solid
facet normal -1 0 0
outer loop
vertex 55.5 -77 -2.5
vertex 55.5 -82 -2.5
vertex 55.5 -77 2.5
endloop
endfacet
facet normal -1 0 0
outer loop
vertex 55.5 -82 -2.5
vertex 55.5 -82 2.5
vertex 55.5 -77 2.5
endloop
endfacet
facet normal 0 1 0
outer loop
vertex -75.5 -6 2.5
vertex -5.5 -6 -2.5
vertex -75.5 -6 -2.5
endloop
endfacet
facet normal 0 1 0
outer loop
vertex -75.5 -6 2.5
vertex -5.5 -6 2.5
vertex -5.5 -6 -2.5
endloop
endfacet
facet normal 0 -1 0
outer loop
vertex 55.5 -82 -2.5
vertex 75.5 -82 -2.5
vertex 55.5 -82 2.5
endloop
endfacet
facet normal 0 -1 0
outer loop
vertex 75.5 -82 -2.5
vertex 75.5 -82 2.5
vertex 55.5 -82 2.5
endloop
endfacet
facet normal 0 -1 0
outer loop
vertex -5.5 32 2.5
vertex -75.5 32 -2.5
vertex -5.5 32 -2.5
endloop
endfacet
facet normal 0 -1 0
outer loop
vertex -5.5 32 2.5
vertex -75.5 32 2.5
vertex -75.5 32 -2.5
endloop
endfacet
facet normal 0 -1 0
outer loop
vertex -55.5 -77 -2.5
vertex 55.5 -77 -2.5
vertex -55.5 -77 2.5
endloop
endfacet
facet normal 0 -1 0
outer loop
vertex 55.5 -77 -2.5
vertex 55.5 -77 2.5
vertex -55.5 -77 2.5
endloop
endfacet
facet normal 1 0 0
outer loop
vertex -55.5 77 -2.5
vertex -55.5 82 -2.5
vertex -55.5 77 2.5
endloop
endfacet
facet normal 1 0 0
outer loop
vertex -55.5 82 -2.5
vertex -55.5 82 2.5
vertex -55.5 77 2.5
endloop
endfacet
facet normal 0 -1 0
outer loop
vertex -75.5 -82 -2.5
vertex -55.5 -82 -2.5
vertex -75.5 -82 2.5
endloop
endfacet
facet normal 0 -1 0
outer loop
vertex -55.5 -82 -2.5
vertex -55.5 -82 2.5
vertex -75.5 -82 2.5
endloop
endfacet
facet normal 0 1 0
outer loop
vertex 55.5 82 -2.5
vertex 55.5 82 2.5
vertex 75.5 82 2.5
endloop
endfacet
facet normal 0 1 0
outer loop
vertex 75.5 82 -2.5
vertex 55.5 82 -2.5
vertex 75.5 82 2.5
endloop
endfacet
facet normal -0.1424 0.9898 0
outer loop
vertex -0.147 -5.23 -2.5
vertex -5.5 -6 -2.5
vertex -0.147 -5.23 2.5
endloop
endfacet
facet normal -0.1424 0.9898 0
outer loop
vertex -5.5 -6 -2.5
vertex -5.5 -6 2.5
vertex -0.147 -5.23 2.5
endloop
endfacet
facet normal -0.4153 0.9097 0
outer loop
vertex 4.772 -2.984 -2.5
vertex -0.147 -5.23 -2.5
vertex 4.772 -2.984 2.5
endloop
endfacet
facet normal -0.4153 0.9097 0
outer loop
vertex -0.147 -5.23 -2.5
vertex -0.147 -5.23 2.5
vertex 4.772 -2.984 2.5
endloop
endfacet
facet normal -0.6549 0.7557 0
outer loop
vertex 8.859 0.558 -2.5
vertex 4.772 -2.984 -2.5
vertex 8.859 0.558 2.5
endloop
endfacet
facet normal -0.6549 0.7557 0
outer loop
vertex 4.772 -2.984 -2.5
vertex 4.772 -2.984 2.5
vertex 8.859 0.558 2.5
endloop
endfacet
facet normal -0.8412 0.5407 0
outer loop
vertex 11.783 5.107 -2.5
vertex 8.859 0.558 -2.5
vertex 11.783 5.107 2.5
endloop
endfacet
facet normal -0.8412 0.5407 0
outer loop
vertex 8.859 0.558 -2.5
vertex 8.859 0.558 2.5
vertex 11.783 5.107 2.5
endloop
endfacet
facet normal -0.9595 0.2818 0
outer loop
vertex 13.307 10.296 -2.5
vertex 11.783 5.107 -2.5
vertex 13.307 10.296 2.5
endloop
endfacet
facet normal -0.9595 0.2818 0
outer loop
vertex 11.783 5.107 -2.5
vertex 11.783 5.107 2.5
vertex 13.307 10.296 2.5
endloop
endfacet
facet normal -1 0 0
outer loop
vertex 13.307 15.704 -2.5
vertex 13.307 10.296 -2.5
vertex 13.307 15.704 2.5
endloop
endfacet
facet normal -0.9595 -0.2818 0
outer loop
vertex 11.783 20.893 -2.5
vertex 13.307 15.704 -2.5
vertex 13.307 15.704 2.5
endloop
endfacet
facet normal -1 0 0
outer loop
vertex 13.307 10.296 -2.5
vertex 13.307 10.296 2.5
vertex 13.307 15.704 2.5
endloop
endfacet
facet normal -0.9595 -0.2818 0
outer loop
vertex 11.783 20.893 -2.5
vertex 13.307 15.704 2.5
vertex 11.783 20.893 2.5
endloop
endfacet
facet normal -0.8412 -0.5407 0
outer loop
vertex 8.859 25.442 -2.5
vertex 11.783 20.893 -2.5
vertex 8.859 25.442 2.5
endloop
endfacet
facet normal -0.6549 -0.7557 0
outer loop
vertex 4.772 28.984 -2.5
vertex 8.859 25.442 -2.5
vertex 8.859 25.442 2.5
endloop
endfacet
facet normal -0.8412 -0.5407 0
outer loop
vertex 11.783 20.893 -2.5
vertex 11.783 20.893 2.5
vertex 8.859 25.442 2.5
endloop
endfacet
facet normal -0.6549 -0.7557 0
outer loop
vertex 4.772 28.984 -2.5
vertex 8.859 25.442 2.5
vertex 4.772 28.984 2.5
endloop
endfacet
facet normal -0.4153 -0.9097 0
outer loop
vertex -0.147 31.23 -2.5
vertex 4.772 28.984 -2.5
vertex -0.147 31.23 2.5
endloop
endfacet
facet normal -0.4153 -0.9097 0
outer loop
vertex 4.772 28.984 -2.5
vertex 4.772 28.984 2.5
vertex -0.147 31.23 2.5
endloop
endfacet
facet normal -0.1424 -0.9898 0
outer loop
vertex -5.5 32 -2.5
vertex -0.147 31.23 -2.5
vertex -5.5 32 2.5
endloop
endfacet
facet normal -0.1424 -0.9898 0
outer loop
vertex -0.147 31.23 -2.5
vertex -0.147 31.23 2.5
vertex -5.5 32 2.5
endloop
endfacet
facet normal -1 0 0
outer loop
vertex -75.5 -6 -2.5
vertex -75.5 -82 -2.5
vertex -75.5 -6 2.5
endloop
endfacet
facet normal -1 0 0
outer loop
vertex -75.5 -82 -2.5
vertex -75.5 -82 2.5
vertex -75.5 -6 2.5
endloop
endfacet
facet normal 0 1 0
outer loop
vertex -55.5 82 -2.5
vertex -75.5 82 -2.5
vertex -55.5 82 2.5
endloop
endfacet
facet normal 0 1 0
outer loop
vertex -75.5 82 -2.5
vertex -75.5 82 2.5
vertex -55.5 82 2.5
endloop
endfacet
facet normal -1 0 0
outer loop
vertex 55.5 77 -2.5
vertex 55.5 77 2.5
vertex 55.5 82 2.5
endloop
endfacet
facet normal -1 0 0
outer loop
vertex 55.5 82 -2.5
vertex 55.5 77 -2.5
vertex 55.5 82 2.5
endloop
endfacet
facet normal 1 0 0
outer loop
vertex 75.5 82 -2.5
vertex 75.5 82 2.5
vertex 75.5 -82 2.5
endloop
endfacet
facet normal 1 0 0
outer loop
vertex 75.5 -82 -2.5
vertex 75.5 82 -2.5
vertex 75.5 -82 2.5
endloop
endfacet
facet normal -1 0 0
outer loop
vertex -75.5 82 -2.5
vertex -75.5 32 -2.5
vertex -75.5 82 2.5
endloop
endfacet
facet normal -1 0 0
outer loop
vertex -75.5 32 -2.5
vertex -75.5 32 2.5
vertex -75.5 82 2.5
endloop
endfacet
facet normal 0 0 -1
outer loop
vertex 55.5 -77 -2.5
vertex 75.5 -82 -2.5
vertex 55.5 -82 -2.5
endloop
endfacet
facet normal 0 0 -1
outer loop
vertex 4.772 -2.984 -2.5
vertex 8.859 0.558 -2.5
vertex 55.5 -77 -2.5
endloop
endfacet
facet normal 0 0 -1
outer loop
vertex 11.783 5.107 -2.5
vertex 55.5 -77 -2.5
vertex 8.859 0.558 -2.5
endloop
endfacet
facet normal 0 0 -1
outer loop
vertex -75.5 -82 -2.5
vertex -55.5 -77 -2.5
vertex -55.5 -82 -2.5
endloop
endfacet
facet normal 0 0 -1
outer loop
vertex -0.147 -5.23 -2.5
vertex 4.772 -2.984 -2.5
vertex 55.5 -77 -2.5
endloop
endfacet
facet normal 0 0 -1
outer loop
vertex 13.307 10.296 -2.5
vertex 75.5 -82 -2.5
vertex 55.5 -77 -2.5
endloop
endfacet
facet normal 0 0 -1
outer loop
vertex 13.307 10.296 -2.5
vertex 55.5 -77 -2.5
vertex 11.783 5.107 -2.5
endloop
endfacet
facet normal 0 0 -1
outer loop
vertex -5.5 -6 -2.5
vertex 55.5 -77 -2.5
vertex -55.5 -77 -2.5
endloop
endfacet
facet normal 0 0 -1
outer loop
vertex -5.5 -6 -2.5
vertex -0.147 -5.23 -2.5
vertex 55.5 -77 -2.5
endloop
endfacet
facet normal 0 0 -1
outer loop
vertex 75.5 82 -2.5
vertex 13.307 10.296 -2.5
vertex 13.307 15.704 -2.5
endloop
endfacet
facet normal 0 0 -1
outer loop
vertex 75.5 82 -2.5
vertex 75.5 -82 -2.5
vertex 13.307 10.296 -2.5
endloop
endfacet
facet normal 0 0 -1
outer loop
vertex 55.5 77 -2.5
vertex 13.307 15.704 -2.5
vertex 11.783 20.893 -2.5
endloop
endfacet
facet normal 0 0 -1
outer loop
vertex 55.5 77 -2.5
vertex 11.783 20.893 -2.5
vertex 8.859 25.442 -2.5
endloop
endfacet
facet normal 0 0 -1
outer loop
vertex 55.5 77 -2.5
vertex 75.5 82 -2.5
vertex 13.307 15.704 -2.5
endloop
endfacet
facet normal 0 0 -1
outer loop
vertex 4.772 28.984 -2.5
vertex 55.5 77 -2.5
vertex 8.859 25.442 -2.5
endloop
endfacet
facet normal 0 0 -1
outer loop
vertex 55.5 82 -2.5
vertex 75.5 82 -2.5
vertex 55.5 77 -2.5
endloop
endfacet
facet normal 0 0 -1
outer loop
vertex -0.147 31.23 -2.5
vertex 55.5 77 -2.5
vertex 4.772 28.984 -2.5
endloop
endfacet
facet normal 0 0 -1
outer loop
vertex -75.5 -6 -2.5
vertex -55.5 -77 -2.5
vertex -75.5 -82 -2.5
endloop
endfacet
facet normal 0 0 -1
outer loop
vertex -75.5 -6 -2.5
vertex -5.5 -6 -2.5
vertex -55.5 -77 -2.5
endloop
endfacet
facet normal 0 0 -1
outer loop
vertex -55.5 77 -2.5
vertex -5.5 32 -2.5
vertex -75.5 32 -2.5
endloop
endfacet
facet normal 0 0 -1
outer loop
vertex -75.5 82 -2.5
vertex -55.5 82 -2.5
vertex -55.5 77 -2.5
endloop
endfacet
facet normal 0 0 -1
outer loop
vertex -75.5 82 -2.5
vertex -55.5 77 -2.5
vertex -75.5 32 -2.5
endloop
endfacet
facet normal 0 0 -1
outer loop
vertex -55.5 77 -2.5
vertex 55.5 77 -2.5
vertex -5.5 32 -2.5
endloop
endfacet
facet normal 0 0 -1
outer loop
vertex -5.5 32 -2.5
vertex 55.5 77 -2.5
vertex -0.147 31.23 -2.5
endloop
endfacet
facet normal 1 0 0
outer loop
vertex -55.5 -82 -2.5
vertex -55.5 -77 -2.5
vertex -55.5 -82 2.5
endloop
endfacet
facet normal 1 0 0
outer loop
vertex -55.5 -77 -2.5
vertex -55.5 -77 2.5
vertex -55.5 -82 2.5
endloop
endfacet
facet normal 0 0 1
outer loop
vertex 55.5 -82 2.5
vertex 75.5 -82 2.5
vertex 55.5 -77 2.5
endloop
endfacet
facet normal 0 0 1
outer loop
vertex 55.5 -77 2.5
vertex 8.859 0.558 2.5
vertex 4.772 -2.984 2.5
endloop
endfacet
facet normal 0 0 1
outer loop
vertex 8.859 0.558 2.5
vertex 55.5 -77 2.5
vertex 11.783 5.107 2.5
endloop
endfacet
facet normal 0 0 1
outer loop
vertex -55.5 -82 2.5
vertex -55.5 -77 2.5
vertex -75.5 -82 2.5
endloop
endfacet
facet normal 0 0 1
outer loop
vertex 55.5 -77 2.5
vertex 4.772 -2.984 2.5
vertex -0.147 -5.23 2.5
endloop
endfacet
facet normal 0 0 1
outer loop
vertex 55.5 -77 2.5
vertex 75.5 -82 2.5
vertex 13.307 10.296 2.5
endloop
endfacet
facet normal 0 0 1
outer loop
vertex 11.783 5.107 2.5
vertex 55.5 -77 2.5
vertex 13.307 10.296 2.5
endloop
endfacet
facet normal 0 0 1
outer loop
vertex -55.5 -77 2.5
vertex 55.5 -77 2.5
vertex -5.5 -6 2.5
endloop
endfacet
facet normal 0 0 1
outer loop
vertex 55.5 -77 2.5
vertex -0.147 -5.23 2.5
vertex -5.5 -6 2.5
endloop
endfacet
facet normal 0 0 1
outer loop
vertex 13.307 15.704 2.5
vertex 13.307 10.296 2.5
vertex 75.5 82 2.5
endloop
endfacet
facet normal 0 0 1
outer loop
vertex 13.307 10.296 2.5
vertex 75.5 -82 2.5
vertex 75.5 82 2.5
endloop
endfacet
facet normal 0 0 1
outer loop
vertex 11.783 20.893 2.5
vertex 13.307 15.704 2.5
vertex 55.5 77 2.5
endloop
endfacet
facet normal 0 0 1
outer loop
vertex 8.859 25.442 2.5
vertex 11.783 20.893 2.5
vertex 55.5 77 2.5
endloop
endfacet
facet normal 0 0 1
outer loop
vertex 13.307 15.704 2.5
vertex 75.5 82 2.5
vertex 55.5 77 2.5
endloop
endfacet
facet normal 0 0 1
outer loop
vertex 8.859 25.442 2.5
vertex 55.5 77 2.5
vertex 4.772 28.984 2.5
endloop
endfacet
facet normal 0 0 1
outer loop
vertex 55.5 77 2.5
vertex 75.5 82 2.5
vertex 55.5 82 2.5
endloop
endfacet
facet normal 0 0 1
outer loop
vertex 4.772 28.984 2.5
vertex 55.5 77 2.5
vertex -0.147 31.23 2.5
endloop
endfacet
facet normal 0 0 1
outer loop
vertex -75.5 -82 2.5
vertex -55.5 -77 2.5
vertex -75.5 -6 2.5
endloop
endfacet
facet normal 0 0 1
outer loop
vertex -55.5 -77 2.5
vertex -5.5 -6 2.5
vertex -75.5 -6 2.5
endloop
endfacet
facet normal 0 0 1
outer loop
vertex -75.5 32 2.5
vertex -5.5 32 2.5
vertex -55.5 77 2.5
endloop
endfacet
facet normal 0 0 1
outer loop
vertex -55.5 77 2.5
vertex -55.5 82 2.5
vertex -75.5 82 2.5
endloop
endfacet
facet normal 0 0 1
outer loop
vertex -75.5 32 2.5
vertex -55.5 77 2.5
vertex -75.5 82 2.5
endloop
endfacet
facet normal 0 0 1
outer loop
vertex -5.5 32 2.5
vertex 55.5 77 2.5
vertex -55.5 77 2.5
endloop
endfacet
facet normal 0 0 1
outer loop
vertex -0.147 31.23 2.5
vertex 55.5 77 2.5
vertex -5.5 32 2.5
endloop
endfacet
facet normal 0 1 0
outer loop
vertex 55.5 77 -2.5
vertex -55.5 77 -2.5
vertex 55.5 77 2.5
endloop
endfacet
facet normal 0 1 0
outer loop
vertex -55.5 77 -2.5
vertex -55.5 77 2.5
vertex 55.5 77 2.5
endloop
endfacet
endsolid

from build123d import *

# Parameters (mm, degrees)
PAD_DEPTH = 2.5


with BuildPart() as part:
    # Sketch → Pad (new body, symmetric)
    with BuildSketch(Plane.XY):
        with BuildLine():
            Line((75.5, 82), (75.5, -82))
            Line((75.5, -82), (55.5, -82))
            Line((55.5, -82), (55.5, -77))
            Line((55.5, -77), (-55.5, -77))
            Line((-55.5, -77), (-55.5, -82))
            Line((-55.5, -82), (-75.5, -82))
            Line((-75.5, -82), (-75.5, -6))
            Line((-5.5, -6), (-75.5, -6))
            ThreePointArc((-5.5, -6), (13.5, 13), (-5.5, 32))
            Line((-75.5, 32), (-5.5, 32))
            Line((-75.5, 32), (-75.5, 82))
            Line((-75.5, 82), (-55.5, 82))
            Line((-55.5, 82), (-55.5, 77))
            Line((-55.5, 77), (55.5, 77))
            Line((55.5, 77), (55.5, 82))
            Line((55.5, 82), (75.5, 82))
        make_face()
    extrude(amount=PAD_DEPTH, both=True)


solid = part.part
